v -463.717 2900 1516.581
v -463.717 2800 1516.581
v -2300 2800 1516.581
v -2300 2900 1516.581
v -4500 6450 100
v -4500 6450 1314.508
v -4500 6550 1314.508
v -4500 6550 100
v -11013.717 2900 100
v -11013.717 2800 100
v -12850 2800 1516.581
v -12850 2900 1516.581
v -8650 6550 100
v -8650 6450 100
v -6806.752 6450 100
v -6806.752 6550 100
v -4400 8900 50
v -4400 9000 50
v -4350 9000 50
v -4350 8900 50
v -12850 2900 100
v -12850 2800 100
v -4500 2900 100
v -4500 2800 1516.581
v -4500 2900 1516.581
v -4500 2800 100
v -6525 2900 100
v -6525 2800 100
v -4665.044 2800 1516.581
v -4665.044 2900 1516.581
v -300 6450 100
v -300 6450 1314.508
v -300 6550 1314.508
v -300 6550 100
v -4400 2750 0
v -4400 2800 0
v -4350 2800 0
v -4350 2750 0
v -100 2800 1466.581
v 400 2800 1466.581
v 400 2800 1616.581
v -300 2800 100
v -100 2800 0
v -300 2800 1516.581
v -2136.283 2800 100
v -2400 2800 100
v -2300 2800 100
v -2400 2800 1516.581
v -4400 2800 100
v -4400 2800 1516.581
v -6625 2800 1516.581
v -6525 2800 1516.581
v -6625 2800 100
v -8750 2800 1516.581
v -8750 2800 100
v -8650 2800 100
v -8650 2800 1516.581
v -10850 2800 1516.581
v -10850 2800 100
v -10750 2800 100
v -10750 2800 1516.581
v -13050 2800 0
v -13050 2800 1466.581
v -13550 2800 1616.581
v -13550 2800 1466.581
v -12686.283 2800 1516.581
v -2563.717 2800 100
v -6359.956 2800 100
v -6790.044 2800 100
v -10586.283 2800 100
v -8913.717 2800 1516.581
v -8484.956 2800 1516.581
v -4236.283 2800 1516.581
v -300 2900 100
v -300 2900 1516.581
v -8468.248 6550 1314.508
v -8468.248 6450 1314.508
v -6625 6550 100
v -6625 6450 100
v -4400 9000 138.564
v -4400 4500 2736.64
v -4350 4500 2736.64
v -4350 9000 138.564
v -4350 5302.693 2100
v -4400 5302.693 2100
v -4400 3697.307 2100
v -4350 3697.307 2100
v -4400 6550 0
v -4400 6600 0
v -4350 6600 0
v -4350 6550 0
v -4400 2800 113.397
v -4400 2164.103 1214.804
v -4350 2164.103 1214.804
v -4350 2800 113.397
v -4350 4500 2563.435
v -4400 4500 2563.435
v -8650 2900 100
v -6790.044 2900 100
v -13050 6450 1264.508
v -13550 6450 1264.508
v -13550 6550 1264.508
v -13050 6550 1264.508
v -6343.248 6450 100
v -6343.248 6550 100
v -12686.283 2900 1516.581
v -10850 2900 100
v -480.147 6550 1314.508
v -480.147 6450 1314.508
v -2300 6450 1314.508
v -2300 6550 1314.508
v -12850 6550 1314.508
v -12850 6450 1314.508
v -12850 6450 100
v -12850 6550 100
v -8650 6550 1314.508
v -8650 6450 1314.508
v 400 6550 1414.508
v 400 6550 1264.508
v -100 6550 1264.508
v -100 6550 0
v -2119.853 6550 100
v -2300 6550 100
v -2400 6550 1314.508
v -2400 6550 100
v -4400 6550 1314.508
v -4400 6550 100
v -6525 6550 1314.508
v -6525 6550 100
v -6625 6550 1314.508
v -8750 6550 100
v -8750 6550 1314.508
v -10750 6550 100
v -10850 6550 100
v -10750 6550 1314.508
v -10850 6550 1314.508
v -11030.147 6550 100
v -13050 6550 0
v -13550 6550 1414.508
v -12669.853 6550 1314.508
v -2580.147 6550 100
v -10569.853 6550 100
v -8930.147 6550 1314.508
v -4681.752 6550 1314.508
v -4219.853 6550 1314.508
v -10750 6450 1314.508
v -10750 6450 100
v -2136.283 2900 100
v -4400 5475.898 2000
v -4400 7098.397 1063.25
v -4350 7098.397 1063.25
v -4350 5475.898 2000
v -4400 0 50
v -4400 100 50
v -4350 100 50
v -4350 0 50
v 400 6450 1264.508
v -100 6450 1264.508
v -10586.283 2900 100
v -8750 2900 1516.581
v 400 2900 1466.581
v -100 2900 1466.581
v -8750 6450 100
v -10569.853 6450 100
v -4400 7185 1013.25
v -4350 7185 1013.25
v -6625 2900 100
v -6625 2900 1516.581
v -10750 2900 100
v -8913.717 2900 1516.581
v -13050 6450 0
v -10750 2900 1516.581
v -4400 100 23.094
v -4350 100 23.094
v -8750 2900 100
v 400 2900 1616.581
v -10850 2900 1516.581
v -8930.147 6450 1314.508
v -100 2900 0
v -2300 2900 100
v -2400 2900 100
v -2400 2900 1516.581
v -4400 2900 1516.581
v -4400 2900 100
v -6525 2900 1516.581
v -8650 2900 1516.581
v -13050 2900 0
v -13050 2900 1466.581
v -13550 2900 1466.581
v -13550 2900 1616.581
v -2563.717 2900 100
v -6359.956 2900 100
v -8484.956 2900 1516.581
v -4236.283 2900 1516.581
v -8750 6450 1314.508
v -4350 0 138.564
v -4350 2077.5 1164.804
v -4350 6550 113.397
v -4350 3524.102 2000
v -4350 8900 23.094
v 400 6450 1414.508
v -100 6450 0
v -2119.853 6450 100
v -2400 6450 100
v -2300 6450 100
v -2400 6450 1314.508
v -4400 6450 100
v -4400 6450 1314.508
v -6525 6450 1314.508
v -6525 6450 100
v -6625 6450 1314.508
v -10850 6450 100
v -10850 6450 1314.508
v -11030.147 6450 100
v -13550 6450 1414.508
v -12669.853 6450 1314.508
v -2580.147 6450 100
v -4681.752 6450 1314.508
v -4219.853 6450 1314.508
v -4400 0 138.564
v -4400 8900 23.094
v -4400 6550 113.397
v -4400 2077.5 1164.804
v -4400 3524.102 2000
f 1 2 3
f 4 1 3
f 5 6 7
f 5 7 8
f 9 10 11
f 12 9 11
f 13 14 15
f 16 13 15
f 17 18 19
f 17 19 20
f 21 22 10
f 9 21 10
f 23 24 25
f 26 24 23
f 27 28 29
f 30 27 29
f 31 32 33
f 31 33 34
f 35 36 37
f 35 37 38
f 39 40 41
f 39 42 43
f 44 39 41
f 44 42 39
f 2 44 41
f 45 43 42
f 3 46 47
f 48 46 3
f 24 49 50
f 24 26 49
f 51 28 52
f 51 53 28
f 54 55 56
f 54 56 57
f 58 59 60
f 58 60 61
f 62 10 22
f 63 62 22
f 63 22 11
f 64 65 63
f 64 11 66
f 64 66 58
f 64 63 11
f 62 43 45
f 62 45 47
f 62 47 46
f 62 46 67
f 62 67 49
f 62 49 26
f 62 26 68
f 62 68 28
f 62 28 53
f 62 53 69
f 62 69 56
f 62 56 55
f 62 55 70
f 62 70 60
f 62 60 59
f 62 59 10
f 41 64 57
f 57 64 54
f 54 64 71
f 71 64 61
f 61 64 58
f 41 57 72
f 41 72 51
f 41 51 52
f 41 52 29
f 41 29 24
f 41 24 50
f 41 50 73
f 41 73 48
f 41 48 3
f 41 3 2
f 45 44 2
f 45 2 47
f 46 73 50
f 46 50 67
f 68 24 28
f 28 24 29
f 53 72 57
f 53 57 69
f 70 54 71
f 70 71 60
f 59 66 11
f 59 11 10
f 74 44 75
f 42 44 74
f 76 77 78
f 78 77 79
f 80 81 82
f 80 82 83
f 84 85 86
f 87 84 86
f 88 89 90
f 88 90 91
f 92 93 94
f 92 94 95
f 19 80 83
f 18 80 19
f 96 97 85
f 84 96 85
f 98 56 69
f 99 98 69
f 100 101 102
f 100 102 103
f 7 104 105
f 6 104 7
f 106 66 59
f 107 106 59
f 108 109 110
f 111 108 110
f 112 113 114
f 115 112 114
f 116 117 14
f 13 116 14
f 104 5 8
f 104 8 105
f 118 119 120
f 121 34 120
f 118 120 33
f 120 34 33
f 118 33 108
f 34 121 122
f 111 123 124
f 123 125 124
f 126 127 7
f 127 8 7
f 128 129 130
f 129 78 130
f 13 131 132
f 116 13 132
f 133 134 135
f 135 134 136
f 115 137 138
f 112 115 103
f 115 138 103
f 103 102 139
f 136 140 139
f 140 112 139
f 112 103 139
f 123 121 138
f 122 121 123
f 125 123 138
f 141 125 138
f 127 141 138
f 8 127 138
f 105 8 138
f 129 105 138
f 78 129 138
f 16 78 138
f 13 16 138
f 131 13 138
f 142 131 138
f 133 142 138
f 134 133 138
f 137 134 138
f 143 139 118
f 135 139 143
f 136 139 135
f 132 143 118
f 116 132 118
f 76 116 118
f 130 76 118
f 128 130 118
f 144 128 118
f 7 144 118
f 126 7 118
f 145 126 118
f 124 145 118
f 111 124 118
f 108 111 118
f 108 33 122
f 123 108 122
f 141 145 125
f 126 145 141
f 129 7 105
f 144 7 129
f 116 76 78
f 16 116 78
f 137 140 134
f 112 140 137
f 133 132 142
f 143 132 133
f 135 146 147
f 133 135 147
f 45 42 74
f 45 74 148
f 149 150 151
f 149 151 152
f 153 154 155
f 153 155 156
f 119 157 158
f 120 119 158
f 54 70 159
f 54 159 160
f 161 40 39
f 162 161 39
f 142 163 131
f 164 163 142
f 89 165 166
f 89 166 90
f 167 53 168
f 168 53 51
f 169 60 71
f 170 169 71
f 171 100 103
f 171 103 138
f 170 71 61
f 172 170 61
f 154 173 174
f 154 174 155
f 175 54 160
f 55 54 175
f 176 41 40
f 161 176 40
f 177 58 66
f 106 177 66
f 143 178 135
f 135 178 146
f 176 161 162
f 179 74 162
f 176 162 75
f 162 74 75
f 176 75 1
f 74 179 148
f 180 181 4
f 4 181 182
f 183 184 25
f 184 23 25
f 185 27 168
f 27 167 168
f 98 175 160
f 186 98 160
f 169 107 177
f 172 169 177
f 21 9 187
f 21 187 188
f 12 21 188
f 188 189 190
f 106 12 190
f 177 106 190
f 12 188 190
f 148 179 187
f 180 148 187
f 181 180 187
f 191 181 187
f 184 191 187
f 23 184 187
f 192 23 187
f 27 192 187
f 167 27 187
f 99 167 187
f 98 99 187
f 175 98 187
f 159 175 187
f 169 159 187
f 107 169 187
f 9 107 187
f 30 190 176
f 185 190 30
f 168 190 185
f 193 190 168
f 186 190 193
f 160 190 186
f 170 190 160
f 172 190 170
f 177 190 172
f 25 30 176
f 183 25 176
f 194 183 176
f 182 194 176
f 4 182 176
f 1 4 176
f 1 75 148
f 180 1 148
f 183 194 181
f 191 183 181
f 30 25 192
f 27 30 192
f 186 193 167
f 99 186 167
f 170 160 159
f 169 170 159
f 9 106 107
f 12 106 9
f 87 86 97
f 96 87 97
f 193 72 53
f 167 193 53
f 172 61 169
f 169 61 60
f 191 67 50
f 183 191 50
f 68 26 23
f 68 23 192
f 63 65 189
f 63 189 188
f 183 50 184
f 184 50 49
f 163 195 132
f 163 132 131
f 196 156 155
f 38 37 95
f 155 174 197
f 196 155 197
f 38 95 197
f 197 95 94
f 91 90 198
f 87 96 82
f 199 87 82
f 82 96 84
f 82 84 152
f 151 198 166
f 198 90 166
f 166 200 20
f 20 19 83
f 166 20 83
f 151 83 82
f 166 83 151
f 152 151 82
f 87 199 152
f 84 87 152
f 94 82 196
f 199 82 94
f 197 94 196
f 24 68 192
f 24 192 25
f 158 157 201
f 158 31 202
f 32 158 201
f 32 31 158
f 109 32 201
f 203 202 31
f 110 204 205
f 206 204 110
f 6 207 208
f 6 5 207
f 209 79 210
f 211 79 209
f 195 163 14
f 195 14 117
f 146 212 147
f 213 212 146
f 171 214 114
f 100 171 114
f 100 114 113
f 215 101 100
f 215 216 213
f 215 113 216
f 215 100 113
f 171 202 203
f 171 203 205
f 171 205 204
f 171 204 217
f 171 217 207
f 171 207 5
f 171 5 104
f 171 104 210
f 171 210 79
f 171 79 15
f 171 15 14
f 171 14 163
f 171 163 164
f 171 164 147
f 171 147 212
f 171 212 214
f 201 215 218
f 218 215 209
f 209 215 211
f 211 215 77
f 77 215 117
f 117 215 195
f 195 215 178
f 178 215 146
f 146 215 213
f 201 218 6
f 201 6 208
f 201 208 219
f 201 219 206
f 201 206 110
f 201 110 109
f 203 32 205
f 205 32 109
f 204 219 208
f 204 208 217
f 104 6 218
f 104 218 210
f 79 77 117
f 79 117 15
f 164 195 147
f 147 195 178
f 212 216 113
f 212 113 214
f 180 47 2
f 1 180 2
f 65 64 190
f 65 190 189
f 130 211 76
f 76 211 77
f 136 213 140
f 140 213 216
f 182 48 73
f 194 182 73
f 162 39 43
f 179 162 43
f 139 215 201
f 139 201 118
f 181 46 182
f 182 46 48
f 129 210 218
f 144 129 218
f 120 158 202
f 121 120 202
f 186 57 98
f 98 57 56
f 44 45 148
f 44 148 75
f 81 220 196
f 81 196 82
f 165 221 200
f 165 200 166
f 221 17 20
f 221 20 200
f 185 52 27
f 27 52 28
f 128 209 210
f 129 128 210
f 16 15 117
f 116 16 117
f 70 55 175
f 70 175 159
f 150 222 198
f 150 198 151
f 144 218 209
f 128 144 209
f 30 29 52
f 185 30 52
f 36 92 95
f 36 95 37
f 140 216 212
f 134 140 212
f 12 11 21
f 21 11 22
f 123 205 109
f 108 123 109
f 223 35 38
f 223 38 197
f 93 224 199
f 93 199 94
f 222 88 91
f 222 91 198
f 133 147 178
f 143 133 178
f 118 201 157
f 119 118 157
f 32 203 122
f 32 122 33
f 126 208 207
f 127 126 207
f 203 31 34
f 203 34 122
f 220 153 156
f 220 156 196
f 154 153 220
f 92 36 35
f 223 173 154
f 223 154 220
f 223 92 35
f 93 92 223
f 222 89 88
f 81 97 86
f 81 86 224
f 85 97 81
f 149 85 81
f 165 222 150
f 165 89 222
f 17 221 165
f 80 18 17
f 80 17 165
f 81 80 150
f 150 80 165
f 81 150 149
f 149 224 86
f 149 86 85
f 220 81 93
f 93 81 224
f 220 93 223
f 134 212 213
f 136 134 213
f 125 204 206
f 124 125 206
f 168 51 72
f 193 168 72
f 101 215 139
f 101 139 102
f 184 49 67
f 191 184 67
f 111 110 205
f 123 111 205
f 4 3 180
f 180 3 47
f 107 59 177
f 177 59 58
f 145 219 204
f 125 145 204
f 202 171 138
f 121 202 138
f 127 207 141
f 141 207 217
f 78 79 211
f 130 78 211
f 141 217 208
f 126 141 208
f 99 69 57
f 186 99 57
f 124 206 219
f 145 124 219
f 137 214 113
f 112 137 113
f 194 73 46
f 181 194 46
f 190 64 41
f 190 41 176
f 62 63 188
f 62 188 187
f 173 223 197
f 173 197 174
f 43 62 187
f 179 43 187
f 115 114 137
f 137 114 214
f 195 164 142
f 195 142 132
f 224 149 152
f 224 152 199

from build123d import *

# Parameters (mm, degrees)
SKETCH_2_W          = 1414.508159515
SKETCH_2_H          = 100
EXTRUDE_2_DEPTH     = 14150
SKETCH_2_W_2        = 1616.580753731
EXTRUDE_2_2_DEPTH   = 14150
CUT_EXTRUDE_1_DEPTH = 1162
CUT_EXTRUDE_2_DEPTH = 1162
CUT_EXTRUDE_3_DEPTH = 1162
CUT_EXTRUDE_4_DEPTH = 1162
EXTRUDE_3_DEPTH     = 50


with BuildPart() as part:
    # Эскиз2 → Бобышка-Вытянуть2 (new body)
    with BuildSketch(Plane.ZY.offset(13650)):
        with Locations((707.254079757, 6500)):
            Rectangle(SKETCH_2_W, SKETCH_2_H)
    extrude(amount=-EXTRUDE_2_DEPTH)

    # Эскиз4 → Вырез-Вытянуть2 (cut)
    with BuildSketch(Plane.XZ.offset(-6450)):
        Polygon((-13550, 2172.390784196), (-13550, 1264.508159515), (-13050, 1264.508159515), (-13050, -667.571915867), (-15150.61658298, -667.571915867), (-15150.61658298, 2172.390784196), align=None)
        Polygon((2000.61658298, -667.571915867), (2000.61658298, 2172.390784196), (400, 2172.390784196), (400, 1264.508159515), (-100, 1264.508159515), (-100, -667.571915867), align=None)
    extrude(amount=-CUT_EXTRUDE_2_DEPTH, mode=Mode.SUBTRACT)

    # Эскиз6 → Вырез-Вытянуть4 (cut)
    with BuildSketch(Plane.XZ.offset(-6450)):
        Polygon((-12850, 1314.508159515), (-12850, 100), (-11030.146798172, 100), align=None)
        Polygon((-12669.853201828, 1314.508159515), (-10850, 100), (-10850, 1314.508159515), align=None)
        Polygon((-8750, 100), (-10569.853201828, 100), (-8750, 1314.508159515), align=None)
        Polygon((-8930.146798172, 1314.508159515), (-10750, 1314.508159515), (-10750, 100), align=None)
        Polygon((-8650, 1314.508159515), (-8650, 100), (-6806.75217409, 100), align=None)
        Polygon((-8468.24782591, 1314.508159515), (-6625, 100), (-6625, 1314.508159515), align=None)
        Polygon((-4681.75217409, 1314.508159515), (-6525, 1314.508159515), (-6525, 100), align=None)
        Polygon((-6343.24782591, 100), (-4500, 1314.508159515), (-4500, 100), align=None)
        Polygon((-4400, 1314.508159515), (-4400, 100), (-2580.146798172, 100), align=None)
        Polygon((-4219.853201828, 1314.508159515), (-2400, 100), (-2400, 1314.508159515), align=None)
        Polygon((-480.146798172, 1314.508159515), (-2300, 1314.508159515), (-2300, 100), align=None)
        Polygon((-300, 100), (-2119.853201828, 100), (-300, 1314.508159515), align=None)
    extrude(amount=-CUT_EXTRUDE_4_DEPTH, mode=Mode.SUBTRACT)


with BuildPart() as body_2:
    # Эскиз2 → Extrude 2 2 (new body)
    with BuildSketch(Plane.ZY.offset(13650)):
        with Locations((808.290376866, 2850)):
            Rectangle(SKETCH_2_W_2, SKETCH_2_H)
    extrude(amount=-EXTRUDE_2_2_DEPTH)

    # Эскиз3 → Вырез-Вытянуть1 (cut)
    with BuildSketch(Plane.XZ.offset(-2800)):
        Polygon((-13550, 2005.004538192), (-13550, 1466.580753731), (-13050, 1466.580753731), (-13050, -834.958161872), (-14812.735944929, -834.958161872), (-14812.735944929, 2005.004538192), align=None)
        Polygon((1662.735944929, -834.958161872), (1662.735944929, 2005.004538192), (400, 2005.004538192), (400, 1466.580753731), (-100, 1466.580753731), (-100, -834.958161872), align=None)
    extrude(amount=-CUT_EXTRUDE_1_DEPTH, mode=Mode.SUBTRACT)

    # Эскиз5 → Вырез-Вытянуть3 (cut)
    with BuildSketch(Plane.XZ.offset(-2800)):
        Polygon((-12850, 1516.580753731), (-12850, 100), (-11013.717347698, 100), align=None)
        Polygon((-12686.282652302, 1516.580753731), (-10850, 100), (-10850, 1516.580753731), align=None)
        Polygon((-8750, 100), (-10586.282652302, 100), (-8750, 1516.580753731), align=None)
        Polygon((-8913.717347698, 1516.580753731), (-10750, 1516.580753731), (-10750, 100), align=None)
        Polygon((-8650, 1516.580753731), (-8650, 100), (-6790.043709488, 100), align=None)
        Polygon((-8484.956290512, 1516.580753731), (-6625, 100), (-6625, 1516.580753731), align=None)
        Polygon((-4665.043709488, 1516.580753731), (-6525, 1516.580753731), (-6525, 100), align=None)
        Polygon((-6359.956290512, 100), (-4500, 1516.580753731), (-4500, 100), align=None)
        Polygon((-4400, 1516.580753731), (-4400, 100), (-2563.717347698, 100), align=None)
        Polygon((-4236.282652302, 1516.580753731), (-2400, 100), (-2400, 1516.580753731), align=None)
        Polygon((-463.717347698, 1516.580753731), (-2300, 1516.580753731), (-2300, 100), align=None)
        Polygon((-300, 100), (-2136.282652302, 100), (-300, 1516.580753731), align=None)
    extrude(amount=-CUT_EXTRUDE_3_DEPTH, mode=Mode.SUBTRACT)


with BuildPart() as body_3:
    # Эскиз7 → Бобышка-Вытянуть3 (new body)
    with BuildSketch(Plane(origin=(-4400, 0, 0), x_dir=(0, 0, -1), z_dir=(1, 0, 0))):
        Polygon((-2736.640275959, 4500), (-138.564064605, 9000), (-50, 9000), (-50, 8900), (-23.094010768, 8900), (-1013.249722428, 7185), (0, 6600), (0, 6550), (-113.397459622, 6550), (-1063.249722428, 7098.397459622), (-2000, 5475.898384862), (-2000, 3524.101615138), (-1214.80416809, 2164.102540378), (-113.397459622, 2800), (0, 2800), (0, 2750), (-1164.80416809, 2077.5), (-23.094010768, 100), (-50, 100), (-50, 0), (-138.564064605, 0), align=None)
        Polygon((-2100, 5302.693304105), (-2100, 3697.306695895), (-2563.435195202, 4500), align=None, mode=Mode.SUBTRACT)
    extrude(amount=EXTRUDE_3_DEPTH)


solid = Compound([part.part, body_2.part, body_3.part])
